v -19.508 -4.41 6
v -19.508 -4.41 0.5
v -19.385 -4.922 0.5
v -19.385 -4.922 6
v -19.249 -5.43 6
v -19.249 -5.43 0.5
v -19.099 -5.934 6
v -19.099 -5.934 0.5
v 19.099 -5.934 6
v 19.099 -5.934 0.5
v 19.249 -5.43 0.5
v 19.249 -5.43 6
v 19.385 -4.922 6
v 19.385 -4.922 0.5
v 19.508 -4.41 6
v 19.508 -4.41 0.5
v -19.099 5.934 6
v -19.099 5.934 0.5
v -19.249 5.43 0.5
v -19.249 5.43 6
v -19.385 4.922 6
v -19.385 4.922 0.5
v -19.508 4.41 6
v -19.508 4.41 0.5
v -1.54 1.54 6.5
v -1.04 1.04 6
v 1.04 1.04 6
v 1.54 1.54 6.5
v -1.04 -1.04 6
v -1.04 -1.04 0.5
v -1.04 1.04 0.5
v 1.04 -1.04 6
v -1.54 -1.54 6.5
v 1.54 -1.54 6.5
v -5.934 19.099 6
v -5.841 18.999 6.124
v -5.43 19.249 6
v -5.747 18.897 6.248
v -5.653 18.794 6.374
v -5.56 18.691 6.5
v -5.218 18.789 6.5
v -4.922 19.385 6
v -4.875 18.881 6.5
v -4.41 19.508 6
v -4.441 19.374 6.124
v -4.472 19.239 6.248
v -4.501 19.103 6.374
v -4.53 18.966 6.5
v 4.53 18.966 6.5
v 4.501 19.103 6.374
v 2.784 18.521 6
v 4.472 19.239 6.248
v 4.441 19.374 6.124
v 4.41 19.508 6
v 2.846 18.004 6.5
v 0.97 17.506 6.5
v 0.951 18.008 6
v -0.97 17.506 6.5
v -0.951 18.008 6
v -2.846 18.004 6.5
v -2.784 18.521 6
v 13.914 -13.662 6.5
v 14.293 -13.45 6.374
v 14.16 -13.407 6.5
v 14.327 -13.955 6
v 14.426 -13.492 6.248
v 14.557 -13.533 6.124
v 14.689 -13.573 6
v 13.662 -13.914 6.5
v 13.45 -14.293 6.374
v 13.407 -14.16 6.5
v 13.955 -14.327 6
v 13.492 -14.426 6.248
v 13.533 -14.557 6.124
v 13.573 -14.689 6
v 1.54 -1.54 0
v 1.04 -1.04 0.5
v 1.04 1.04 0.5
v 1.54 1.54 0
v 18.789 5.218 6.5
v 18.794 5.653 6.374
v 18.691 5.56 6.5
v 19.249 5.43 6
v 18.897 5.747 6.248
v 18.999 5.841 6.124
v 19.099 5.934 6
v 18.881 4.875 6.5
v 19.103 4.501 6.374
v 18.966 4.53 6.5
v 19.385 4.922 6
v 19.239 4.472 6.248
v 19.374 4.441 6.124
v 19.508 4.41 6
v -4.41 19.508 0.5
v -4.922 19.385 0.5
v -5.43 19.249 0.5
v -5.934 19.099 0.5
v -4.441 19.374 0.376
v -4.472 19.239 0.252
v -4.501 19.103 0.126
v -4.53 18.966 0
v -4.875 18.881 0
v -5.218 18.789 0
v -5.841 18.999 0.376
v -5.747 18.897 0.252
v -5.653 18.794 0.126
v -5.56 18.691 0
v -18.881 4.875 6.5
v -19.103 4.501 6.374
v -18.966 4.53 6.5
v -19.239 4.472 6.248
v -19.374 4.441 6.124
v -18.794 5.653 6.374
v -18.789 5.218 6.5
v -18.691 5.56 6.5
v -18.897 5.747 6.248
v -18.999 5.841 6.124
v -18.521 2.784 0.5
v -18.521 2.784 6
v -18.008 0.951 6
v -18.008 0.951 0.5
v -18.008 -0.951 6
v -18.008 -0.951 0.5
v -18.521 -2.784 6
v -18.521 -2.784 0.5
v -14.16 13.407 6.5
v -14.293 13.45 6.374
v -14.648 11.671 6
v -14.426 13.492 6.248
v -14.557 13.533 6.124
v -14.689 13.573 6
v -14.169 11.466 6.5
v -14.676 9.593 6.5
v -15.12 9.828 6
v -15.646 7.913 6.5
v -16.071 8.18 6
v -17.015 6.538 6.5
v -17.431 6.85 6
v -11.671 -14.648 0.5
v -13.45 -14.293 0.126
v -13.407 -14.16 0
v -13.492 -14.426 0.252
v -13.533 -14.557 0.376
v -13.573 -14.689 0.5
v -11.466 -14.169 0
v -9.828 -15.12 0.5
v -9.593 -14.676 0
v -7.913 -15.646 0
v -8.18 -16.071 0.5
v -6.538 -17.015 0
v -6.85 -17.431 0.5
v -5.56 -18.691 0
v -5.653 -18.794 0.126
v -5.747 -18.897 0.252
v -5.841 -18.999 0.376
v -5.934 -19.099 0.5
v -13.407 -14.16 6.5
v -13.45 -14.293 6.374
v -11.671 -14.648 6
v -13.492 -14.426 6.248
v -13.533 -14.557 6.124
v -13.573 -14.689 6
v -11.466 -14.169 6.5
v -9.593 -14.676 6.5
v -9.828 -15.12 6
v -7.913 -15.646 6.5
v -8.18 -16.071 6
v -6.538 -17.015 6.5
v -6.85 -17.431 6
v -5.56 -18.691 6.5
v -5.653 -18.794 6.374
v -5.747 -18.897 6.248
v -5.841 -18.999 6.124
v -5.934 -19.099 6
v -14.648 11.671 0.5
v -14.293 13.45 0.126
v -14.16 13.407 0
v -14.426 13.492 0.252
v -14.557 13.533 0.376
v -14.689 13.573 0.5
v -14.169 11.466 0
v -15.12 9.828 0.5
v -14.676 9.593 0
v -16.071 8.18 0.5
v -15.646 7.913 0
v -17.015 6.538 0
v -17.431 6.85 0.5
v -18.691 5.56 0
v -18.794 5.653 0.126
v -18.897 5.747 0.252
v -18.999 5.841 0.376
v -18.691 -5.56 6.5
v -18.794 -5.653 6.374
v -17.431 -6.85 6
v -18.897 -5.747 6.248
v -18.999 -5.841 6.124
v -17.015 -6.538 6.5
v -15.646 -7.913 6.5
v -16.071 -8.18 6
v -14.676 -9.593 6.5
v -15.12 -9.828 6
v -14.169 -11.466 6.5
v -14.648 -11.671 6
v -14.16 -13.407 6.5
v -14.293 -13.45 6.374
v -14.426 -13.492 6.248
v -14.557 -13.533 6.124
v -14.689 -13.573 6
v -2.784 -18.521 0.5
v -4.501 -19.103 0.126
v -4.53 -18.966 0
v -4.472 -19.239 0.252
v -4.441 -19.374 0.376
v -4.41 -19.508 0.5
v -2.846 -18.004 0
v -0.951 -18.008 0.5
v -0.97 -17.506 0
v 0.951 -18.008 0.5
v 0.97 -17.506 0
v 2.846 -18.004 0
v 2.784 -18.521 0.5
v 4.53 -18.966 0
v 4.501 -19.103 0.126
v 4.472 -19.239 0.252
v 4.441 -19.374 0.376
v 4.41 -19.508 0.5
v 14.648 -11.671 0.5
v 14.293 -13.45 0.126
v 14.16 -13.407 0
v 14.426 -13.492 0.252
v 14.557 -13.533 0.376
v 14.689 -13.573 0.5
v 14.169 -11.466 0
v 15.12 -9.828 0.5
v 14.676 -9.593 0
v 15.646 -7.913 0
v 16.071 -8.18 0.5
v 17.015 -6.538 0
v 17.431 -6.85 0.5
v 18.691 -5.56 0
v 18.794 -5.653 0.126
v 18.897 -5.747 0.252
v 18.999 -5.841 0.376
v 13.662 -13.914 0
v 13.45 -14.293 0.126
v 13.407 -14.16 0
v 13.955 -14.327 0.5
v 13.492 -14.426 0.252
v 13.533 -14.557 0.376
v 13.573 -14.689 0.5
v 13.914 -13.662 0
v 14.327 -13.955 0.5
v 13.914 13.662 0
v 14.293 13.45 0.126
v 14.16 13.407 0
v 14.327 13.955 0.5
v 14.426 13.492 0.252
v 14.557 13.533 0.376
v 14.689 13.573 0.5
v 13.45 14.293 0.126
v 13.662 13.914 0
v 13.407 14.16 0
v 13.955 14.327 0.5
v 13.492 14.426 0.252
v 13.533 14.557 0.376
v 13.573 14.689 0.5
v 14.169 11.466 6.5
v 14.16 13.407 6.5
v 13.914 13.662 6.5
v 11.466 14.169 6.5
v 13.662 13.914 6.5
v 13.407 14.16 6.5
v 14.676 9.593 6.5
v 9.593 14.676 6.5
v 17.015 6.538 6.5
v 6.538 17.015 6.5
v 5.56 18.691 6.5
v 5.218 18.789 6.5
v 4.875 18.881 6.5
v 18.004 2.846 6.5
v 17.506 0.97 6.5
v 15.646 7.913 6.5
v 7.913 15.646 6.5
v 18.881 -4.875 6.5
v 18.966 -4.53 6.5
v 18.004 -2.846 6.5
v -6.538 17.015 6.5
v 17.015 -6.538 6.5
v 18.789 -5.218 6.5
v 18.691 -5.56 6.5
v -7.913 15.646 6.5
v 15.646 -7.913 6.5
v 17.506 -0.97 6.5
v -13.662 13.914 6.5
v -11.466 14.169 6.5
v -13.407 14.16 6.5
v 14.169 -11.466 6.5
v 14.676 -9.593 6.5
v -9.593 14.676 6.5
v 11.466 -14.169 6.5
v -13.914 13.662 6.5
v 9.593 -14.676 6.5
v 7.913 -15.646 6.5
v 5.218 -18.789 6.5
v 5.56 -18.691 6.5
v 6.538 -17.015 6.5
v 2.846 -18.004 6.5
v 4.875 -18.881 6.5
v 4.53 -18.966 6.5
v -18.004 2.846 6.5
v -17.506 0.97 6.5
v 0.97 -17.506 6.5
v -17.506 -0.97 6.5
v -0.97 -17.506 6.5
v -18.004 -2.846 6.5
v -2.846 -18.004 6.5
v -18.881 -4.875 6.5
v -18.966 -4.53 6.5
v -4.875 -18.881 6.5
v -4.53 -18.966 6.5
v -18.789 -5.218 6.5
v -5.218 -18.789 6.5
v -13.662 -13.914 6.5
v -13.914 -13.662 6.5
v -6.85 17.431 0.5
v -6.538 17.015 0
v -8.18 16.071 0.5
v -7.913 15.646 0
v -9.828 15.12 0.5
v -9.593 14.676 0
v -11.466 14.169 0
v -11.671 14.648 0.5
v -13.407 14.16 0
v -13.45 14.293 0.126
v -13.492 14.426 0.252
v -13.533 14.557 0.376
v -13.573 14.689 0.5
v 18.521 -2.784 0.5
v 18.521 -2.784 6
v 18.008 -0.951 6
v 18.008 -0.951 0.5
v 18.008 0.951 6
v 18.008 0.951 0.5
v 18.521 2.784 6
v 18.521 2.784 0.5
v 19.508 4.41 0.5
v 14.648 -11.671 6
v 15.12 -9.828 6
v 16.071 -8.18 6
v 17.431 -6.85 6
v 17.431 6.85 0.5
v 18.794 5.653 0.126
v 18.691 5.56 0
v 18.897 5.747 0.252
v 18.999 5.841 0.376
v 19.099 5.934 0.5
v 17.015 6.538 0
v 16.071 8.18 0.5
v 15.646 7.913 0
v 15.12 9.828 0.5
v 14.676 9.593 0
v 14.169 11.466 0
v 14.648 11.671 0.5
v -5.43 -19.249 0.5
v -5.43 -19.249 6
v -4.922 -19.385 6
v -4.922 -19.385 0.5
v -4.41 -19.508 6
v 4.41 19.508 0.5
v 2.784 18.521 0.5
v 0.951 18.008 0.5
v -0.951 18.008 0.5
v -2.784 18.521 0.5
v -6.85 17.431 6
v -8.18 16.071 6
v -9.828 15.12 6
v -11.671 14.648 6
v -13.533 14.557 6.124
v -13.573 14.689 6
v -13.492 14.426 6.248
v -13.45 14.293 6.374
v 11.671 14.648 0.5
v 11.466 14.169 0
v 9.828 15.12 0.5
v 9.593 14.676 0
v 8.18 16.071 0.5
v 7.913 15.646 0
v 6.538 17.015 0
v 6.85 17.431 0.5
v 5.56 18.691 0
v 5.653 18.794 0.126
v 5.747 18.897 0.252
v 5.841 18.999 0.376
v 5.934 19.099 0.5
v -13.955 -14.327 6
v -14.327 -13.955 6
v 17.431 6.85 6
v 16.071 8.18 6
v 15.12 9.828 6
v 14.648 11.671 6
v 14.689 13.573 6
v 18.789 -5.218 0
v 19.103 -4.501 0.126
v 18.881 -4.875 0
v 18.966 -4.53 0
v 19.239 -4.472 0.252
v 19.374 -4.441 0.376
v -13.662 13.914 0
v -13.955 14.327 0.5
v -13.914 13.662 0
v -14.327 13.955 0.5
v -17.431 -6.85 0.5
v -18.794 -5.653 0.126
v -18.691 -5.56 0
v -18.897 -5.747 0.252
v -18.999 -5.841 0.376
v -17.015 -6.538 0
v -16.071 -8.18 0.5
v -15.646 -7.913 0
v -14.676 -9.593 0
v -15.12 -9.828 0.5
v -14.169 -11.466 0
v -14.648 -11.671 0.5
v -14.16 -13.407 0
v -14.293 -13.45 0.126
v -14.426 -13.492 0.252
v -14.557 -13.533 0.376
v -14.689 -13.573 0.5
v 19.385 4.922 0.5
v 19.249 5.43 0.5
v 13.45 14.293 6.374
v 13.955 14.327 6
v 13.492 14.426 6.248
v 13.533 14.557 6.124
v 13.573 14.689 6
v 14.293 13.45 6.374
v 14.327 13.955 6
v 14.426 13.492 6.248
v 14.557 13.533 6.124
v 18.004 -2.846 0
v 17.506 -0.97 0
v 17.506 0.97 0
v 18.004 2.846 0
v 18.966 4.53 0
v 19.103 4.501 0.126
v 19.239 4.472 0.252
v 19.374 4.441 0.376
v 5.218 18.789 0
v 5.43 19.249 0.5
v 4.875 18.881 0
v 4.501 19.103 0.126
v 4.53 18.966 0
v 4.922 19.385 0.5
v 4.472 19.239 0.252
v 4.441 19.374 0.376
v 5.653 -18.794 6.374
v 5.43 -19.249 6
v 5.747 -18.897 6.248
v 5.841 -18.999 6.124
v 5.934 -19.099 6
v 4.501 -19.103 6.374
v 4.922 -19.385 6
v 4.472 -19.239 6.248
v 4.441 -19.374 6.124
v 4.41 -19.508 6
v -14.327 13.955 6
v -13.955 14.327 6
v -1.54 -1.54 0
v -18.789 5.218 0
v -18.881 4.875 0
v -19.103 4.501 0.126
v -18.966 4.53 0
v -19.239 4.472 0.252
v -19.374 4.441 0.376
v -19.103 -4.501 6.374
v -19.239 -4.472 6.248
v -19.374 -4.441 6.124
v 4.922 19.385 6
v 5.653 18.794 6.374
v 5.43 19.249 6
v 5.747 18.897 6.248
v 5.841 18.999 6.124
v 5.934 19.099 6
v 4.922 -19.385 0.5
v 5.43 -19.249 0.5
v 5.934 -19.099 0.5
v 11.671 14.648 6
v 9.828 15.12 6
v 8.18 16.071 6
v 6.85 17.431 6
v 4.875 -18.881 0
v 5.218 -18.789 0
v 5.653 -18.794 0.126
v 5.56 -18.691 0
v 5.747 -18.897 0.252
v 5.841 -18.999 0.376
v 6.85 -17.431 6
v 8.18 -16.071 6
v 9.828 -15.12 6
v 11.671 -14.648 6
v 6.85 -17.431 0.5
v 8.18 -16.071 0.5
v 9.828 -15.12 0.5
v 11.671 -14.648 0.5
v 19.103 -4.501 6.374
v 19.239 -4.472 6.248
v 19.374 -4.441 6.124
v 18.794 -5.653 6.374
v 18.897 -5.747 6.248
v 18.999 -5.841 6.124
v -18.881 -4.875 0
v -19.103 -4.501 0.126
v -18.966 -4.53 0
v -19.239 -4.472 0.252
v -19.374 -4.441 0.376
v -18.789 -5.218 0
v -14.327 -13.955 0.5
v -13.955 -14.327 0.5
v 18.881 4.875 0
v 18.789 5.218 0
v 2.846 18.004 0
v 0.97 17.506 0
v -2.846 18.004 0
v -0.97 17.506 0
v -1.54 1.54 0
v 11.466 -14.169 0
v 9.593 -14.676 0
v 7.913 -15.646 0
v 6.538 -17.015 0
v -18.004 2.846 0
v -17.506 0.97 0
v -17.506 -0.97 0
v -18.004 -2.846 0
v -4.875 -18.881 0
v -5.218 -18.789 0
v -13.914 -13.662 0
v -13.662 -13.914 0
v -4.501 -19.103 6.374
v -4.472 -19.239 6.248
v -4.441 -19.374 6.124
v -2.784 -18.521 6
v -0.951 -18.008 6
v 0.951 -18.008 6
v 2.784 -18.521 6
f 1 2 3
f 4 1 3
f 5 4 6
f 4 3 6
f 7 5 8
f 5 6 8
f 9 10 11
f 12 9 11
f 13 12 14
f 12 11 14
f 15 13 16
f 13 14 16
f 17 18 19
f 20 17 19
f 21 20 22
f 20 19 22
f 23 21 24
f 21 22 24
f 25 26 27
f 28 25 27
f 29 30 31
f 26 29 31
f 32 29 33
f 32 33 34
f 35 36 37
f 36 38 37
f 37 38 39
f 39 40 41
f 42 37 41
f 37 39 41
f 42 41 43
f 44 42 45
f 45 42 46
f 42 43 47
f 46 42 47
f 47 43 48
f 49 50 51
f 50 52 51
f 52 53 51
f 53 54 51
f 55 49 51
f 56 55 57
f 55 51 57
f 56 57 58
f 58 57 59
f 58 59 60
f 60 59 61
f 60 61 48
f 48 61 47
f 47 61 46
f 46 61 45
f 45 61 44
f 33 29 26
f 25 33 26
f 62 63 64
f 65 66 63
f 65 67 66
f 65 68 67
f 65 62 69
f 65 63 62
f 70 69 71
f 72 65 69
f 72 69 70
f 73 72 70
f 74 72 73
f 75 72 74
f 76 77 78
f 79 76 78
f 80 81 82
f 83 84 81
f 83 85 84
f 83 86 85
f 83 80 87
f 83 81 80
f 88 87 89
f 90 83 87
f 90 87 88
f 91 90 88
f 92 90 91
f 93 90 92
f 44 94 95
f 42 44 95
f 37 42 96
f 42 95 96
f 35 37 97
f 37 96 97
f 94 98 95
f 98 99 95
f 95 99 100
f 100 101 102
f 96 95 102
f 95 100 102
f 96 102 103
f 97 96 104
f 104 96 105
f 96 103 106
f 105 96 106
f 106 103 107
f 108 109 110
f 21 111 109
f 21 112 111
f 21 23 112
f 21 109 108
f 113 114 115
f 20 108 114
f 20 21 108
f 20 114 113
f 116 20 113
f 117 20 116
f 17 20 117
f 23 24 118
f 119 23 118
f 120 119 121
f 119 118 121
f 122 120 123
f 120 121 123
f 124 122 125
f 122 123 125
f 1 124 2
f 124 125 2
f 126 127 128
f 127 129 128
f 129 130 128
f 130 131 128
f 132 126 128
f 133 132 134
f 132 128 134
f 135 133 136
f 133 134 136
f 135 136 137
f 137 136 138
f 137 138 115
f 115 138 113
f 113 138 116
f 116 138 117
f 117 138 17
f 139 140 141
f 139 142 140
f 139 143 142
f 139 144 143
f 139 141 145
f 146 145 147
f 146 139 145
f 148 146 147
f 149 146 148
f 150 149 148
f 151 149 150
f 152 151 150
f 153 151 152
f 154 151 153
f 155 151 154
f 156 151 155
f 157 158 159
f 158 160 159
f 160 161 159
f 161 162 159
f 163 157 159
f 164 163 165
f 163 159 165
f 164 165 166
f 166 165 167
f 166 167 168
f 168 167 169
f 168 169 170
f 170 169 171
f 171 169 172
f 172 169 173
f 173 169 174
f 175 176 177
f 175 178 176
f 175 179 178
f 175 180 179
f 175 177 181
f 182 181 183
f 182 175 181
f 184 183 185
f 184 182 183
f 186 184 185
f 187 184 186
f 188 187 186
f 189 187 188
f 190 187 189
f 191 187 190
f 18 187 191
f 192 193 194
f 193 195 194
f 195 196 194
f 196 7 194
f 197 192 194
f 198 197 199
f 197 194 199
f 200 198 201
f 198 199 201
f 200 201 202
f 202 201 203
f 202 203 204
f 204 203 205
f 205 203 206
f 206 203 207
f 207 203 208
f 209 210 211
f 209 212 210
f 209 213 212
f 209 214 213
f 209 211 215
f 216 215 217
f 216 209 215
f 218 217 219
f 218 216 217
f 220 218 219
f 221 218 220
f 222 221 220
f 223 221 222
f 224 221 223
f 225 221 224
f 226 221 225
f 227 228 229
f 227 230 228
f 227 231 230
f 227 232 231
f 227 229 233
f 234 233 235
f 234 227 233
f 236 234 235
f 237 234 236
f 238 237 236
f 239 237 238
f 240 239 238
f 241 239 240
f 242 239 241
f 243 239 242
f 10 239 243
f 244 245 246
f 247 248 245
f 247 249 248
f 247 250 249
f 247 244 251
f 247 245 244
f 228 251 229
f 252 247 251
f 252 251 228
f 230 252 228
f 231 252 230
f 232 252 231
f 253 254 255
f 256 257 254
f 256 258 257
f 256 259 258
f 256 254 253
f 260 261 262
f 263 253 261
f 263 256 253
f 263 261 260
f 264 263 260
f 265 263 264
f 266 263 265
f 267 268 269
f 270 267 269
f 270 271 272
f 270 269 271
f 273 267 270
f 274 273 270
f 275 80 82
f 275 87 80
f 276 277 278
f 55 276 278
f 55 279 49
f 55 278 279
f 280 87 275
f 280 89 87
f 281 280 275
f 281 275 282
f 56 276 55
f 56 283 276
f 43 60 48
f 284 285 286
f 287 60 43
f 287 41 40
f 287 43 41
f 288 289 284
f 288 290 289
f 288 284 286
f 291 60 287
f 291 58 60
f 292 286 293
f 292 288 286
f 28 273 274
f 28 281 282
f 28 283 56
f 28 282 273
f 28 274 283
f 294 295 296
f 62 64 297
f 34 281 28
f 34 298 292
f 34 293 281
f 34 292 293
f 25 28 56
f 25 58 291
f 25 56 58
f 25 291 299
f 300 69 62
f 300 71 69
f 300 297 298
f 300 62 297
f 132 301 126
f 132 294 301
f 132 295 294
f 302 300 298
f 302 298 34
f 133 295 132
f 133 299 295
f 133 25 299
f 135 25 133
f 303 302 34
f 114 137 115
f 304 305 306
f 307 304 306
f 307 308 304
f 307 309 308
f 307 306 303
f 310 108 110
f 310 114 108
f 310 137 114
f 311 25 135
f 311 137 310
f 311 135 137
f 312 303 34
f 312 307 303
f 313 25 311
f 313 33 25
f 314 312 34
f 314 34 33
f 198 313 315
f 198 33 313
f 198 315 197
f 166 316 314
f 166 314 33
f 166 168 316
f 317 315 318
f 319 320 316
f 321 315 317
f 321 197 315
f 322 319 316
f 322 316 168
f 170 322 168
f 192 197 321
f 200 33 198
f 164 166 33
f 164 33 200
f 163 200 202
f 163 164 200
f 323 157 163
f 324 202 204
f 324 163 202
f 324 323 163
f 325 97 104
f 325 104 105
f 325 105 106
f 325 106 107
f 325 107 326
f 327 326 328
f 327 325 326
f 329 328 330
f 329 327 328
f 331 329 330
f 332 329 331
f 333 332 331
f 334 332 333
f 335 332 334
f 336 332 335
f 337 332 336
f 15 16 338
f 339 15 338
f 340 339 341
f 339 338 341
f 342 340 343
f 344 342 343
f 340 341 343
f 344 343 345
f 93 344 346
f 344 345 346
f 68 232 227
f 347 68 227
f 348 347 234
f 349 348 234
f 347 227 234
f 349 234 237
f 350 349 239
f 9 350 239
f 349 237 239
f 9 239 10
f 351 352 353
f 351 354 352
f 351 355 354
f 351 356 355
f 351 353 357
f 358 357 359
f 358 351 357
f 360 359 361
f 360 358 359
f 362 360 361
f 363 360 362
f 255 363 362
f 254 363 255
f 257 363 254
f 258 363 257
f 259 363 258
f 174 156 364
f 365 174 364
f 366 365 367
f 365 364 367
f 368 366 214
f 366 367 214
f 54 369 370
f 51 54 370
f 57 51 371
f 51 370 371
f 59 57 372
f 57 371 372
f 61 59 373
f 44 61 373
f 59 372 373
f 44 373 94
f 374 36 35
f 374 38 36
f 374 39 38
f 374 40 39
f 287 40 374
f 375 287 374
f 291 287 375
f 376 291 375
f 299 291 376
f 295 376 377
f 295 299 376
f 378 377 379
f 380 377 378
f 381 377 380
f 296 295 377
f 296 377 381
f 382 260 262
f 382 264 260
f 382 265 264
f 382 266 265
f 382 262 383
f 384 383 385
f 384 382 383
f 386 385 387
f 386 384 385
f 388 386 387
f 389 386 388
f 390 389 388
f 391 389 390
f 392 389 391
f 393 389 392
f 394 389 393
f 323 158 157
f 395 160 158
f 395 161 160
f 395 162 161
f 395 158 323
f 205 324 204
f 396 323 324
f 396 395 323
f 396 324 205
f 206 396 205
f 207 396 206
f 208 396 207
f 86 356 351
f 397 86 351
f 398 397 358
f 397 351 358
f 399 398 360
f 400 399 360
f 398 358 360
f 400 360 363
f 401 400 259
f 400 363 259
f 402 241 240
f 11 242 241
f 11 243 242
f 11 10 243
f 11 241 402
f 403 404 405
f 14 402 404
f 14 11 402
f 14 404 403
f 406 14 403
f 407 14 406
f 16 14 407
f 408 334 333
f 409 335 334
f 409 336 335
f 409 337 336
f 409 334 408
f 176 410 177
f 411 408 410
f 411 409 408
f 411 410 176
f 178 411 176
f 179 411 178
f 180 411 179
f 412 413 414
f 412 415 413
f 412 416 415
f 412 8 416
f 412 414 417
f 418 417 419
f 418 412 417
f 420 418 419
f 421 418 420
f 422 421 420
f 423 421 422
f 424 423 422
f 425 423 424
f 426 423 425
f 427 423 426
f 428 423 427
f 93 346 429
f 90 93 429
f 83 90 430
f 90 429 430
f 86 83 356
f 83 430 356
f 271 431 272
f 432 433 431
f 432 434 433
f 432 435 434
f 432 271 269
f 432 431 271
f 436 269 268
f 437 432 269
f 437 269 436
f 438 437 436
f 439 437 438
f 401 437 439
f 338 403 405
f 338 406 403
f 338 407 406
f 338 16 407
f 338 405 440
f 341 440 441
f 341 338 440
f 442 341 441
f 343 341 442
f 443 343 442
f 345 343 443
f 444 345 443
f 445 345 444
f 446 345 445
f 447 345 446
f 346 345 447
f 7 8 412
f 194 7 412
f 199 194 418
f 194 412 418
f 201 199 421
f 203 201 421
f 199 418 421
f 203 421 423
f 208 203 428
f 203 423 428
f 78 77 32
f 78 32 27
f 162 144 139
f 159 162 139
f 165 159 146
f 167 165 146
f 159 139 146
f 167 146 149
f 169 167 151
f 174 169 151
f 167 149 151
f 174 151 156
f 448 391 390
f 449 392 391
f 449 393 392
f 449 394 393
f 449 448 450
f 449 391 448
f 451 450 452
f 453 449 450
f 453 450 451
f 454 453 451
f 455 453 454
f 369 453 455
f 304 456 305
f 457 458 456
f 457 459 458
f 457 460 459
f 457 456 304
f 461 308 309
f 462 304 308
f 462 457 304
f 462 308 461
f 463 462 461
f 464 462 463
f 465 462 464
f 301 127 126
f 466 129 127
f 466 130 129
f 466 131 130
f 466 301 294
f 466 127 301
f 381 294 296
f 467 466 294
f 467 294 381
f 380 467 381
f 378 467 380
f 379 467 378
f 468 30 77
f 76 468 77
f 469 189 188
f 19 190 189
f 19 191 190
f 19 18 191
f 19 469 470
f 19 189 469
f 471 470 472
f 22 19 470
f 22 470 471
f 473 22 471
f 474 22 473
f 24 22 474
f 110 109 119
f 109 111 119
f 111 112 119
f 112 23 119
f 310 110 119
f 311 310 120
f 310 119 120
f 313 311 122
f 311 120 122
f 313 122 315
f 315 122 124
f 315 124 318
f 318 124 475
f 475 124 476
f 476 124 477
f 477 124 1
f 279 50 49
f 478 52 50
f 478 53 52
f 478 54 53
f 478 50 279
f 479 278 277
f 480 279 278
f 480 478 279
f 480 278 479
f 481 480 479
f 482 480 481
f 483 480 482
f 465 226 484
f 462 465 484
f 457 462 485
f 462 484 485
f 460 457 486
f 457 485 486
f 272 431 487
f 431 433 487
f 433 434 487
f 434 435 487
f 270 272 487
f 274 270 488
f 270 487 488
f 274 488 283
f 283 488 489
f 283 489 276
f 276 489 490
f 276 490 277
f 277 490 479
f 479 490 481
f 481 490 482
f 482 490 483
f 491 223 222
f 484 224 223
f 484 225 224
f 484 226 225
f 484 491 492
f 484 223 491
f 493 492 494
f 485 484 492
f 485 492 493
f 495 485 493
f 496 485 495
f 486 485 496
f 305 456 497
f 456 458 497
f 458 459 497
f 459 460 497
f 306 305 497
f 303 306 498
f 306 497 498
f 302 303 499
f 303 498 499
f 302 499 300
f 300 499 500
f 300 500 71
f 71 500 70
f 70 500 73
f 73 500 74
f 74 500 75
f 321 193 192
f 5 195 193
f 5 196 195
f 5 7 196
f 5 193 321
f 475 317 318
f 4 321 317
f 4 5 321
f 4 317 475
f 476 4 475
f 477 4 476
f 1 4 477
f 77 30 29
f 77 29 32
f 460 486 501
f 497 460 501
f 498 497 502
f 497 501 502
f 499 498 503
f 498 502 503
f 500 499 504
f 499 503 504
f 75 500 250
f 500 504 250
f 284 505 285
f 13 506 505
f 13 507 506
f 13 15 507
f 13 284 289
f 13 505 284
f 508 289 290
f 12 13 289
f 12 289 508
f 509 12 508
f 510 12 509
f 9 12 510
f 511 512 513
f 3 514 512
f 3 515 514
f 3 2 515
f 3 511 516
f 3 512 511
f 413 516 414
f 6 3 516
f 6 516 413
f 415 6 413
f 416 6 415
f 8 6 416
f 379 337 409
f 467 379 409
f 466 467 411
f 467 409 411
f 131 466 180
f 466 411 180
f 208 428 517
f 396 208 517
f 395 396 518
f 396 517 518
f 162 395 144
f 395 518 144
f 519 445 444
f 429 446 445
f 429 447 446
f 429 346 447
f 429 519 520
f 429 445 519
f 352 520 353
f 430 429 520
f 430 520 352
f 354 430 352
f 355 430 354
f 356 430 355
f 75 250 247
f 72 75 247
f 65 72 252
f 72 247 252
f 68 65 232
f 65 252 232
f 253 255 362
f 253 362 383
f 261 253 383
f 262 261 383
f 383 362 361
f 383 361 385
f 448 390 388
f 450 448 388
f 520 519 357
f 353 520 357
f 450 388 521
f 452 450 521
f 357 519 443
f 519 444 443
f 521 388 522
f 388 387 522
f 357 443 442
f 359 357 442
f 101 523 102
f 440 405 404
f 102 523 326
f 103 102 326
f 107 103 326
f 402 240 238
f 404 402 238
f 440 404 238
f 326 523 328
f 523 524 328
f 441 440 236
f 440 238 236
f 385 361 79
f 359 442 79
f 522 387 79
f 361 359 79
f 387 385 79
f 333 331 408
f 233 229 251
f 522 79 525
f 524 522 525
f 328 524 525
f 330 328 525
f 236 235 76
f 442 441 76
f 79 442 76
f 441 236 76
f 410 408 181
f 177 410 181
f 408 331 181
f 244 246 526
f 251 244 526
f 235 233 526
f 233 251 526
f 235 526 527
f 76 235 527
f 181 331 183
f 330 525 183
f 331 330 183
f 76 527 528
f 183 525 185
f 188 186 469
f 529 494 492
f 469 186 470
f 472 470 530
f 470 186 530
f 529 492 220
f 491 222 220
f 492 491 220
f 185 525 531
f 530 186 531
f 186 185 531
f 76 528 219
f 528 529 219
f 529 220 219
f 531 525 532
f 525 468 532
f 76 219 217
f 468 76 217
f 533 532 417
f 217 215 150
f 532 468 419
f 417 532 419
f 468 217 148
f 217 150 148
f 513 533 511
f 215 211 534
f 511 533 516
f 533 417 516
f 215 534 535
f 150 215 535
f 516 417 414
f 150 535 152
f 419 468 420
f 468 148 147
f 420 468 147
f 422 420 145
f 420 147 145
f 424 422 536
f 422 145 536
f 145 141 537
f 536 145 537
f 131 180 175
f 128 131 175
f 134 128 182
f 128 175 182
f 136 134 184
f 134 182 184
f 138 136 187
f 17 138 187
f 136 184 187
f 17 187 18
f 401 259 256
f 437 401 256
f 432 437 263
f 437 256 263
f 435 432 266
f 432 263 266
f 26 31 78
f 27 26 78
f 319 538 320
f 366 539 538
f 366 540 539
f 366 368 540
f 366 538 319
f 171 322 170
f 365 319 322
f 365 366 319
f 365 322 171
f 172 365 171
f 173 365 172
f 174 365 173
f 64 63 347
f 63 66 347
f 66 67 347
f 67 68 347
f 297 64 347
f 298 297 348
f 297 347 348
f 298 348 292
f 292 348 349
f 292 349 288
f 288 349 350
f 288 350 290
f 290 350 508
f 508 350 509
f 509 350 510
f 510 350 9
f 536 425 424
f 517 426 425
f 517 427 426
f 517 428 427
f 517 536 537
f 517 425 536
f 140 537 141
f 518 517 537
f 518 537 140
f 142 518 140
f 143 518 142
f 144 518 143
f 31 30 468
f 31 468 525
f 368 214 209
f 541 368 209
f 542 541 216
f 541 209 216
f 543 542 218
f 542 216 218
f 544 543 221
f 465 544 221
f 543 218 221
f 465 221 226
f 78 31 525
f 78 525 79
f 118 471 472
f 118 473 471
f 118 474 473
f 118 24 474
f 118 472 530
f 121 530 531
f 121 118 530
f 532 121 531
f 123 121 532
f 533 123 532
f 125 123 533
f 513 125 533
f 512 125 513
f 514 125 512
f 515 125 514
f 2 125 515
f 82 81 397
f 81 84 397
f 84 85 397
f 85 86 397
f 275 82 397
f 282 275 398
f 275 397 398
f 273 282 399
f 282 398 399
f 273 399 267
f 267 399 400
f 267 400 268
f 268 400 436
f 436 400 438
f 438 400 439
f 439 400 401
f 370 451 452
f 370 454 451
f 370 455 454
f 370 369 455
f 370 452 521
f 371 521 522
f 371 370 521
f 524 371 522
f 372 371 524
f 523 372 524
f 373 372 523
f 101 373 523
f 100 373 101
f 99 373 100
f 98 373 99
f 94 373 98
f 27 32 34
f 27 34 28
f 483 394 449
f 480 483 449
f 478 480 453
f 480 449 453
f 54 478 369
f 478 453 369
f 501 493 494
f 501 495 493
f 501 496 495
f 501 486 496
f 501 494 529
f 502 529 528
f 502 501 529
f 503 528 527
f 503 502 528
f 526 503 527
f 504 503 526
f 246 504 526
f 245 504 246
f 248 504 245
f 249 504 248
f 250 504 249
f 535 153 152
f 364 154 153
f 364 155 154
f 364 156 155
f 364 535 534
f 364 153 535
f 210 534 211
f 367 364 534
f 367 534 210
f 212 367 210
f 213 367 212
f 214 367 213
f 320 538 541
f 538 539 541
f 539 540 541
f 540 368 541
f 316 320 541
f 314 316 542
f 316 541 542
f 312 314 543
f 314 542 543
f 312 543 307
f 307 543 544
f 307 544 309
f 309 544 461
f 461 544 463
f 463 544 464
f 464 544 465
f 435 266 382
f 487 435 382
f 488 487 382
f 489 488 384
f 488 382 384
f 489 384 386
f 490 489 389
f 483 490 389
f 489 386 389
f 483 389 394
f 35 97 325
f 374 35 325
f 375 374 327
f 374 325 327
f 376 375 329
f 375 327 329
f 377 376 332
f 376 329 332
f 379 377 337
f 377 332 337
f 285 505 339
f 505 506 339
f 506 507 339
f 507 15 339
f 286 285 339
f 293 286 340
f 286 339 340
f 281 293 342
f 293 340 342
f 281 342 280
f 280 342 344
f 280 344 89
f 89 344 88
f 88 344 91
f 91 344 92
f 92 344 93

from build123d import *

# Parameters (mm, degrees)
SKIZZE1_R                       = 20
SKIZZE1_W                       = 2.08
SKIZZE1_H                       = 2.08
AUFSATZ_LINEAR_AUSTRAGEN1_DEPTH = 6.5
SCHNITT_LINEAR_AUSTRAGEN1_DEPTH = 6.5
KREISMUSTER1_COUNT              = 12
FASE1_SIZE                      = 0.5


with BuildPart() as part:
    # Skizze1 → Aufsatz-Linear austragen1 (new body)
    with BuildSketch(Plane.XY):
        with Locations(Location((0, 0, 0), (0, 0, 180))):
            Circle(SKIZZE1_R)
        Rectangle(SKIZZE1_W, SKIZZE1_H, mode=Mode.SUBTRACT)
    extrude(amount=AUFSATZ_LINEAR_AUSTRAGEN1_DEPTH)

    # Skizze2 → Schnitt-Linear austragen1 (cut)
    with BuildSketch(Plane.XY):
        with BuildLine():
            Line((-5.535516041, 20.658827109), (5.535516041, 20.658827109))
            ThreePointArc((5.535516041, 20.658827109), (0, 17.943458035), (-5.535516041, 20.658827109))
        make_face()
    schnitt_linear_austragen1 = extrude(amount=SCHNITT_LINEAR_AUSTRAGEN1_DEPTH, mode=Mode.SUBTRACT)

    # Kreismuster1: Schnitt-Linear austragen1 ×12 about axis
    kreismuster1_axis = Axis((0, 0, 0), (0, 0, 1))
    for i in range(1, KREISMUSTER1_COUNT):
        add(schnitt_linear_austragen1.rotate(kreismuster1_axis, i * 360 / KREISMUSTER1_COUNT), mode=Mode.SUBTRACT)

    # Fase1
    fase1_edges = [part.edges().sort_by_distance(p)[0] for p in [
        (1.04, 0, 6.5),
        (0, 1.04, 6.5),
        (-19.318516526, 5.176380902, 0),
        (-15.53949049, 8.971729017, 0),
        (-19.318516526, 5.176380902, 6.5),
        (-15.53949049, 8.971729017, 6.5),
        (-14.142135624, -14.142135624, 0),
        (-15.53949049, -8.971729017, 0),
        (-14.142135624, -14.142135624, 6.5),
        (-15.53949049, -8.971729017, 6.5),
        (5.176380902, -19.318516526, 0),
        (0, -17.943458035, 0),
        (5.176380902, -19.318516526, 6.5),
        (0, -17.943458035, 6.5),
        (19.318516526, -5.176380902, 0),
        (15.53949049, -8.971729017, 0),
        (19.318516526, -5.176380902, 6.5),
        (15.53949049, -8.971729017, 6.5),
        (14.142135624, 14.142135624, 0),
        (15.53949049, 8.971729017, 0),
        (14.142135624, 14.142135624, 6.5),
        (15.53949049, 8.971729017, 6.5),
        (-5.176380902, 19.318516526, 6.5),
        (-5.176380902, 19.318516526, 0),
        (0, 17.943458035, 0),
        (0, 17.943458035, 6.5),
        (-14.142135624, 14.142135624, 0),
        (-19.318516526, -5.176380902, 0),
        (-5.176380902, -19.318516526, 0),
        (14.142135624, -14.142135624, 0),
        (19.318516526, 5.176380902, 0),
        (5.176380902, 19.318516526, 0),
        (-8.971729017, 15.53949049, 0),
        (-17.943458035, 0, 0),
        (-8.971729017, -15.53949049, 0),
        (8.971729017, -15.53949049, 0),
        (17.943458035, 0, 0),
        (8.971729017, 15.53949049, 0),
        (-14.142135624, 14.142135624, 6.5),
        (-19.318516526, -5.176380902, 6.5),
        (-5.176380902, -19.318516526, 6.5),
        (14.142135624, -14.142135624, 6.5),
        (19.318516526, 5.176380902, 6.5),
        (5.176380902, 19.318516526, 6.5),
        (8.971729017, 15.53949049, 6.5),
        (17.943458035, 0, 6.5),
        (8.971729017, -15.53949049, 6.5),
        (-8.971729017, -15.53949049, 6.5),
        (-1.04, 0, 0),
        (0, -1.04, 0),
        (-17.943458035, 0, 6.5),
        (1.04, 0, 0),
        (-8.971729017, 15.53949049, 6.5),
        (0, 1.04, 0),
        (-1.04, 0, 6.5),
        (0, -1.04, 6.5),
    ]]
    chamfer(fase1_edges, length=FASE1_SIZE)


solid = part.part
